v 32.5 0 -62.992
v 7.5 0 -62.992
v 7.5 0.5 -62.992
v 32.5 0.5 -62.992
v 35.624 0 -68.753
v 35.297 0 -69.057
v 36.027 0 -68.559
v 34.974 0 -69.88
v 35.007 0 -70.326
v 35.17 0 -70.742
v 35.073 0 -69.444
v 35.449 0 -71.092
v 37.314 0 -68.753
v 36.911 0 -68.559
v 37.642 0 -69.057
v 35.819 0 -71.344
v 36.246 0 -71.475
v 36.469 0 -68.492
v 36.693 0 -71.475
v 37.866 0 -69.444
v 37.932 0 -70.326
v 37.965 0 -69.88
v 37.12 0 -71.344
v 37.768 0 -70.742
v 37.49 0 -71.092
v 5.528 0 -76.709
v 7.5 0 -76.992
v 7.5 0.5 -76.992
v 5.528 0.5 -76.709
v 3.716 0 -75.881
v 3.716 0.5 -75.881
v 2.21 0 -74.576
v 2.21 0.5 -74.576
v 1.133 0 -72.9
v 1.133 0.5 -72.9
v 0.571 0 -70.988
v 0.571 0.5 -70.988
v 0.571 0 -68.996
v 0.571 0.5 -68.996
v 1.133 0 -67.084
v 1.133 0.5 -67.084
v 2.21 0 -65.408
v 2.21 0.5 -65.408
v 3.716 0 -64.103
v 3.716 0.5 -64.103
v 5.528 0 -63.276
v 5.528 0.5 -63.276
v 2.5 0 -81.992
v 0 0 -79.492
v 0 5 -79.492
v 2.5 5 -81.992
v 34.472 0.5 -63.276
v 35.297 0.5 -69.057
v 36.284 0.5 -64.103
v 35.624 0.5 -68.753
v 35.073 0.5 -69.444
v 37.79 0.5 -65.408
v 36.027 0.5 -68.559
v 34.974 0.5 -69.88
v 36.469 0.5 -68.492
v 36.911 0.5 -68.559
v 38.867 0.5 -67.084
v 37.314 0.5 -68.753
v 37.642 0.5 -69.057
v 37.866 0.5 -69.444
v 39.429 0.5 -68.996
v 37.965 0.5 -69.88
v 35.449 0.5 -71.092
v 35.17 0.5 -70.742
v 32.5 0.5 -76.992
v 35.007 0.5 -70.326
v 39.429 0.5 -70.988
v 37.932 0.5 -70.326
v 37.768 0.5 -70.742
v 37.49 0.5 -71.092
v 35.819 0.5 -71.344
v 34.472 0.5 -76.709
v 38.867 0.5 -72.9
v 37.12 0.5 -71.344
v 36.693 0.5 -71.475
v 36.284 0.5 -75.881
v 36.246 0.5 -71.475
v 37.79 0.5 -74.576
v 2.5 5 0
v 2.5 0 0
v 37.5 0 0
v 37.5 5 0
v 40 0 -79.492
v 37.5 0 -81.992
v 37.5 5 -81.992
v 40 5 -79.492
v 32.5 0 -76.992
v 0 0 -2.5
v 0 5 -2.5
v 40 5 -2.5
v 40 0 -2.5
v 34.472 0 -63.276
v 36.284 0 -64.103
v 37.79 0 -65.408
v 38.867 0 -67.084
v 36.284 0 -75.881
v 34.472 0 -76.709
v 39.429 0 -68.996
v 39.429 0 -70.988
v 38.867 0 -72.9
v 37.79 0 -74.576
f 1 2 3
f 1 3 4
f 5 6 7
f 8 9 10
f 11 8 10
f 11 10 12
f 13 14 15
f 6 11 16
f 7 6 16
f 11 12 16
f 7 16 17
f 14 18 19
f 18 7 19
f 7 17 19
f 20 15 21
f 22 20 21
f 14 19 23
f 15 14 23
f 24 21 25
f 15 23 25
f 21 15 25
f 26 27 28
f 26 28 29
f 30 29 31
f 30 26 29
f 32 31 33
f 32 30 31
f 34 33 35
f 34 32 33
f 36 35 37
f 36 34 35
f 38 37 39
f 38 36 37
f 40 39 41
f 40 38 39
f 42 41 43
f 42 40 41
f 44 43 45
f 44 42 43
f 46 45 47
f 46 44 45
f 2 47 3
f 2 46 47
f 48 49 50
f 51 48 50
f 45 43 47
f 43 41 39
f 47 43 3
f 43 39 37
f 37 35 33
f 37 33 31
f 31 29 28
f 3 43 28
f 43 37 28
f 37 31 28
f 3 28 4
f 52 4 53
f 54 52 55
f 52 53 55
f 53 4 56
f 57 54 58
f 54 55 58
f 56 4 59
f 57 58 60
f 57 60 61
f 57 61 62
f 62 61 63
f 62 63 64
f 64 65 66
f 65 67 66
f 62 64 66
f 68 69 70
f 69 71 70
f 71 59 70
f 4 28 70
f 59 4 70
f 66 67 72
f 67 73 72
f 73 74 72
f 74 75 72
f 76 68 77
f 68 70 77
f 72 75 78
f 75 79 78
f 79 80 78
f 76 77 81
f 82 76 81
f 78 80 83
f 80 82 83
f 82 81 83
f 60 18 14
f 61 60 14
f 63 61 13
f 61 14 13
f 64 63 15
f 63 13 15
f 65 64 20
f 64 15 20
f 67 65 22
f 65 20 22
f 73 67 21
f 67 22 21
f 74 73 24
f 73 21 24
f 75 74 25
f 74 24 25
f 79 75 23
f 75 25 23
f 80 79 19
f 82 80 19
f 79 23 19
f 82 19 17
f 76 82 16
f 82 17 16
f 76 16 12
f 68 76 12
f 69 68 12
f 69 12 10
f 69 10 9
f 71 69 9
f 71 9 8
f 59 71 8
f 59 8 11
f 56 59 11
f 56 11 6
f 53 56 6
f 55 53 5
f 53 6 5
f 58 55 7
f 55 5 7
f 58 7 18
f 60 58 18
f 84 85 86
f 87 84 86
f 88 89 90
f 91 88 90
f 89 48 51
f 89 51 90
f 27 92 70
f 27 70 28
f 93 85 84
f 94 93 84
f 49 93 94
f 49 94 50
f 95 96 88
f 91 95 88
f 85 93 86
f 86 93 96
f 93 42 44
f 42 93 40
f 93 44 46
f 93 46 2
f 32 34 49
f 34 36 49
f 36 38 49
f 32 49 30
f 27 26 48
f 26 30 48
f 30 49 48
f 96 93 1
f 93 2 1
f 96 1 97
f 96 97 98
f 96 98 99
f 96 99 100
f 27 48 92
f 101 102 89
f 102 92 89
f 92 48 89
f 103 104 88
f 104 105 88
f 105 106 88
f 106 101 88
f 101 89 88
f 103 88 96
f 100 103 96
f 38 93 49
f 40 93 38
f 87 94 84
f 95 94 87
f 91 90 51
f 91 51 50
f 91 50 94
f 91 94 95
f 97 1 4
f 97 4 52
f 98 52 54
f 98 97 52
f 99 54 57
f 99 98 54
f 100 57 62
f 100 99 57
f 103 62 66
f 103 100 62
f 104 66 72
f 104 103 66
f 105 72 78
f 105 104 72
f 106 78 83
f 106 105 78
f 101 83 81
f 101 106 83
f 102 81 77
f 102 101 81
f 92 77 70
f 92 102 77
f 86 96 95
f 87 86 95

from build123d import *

# Parameters (mm, degrees)
SKETCH1_W           = 40
SKETCH1_H           = 81.992065469
BOSS_EXTRUDE4_DEPTH = 5
CHAMFER3_SIZE       = 2.5
CHAMFER4_SIZE       = 2.5
CHAMFER5_SIZE       = 2.5
CHAMFER6_SIZE       = 2.5
SKETCH5_R           = 1.5
CUT_EXTRUDE5_DEPTH  = 0.5


with BuildPart() as part:
    # Sketch1 → Boss-Extrude4 (new body)
    with BuildSketch(Plane(origin=(0, 0, 0), x_dir=(1, 0, 0), z_dir=(0, 1, 0))):
        with Locations((20, 40.996032735)):
            Rectangle(SKETCH1_W, SKETCH1_H)
    extrude(amount=BOSS_EXTRUDE4_DEPTH)

    # Chamfer3
    chamfer3_edges = [part.edges().sort_by_distance(p)[0] for p in [
        (40, 2.5, -81.992065469),
    ]]
    chamfer(chamfer3_edges, length=CHAMFER3_SIZE)

    # Chamfer4
    chamfer4_edges = [part.edges().sort_by_distance(p)[0] for p in [
        (0, 2.5, -81.992065469),
    ]]
    chamfer(chamfer4_edges, length=CHAMFER4_SIZE)

    # Chamfer5
    chamfer5_edges = [part.edges().sort_by_distance(p)[0] for p in [
        (0, 2.5, 0),
    ]]
    chamfer(chamfer5_edges, length=CHAMFER5_SIZE)

    # Chamfer6
    chamfer6_edges = [part.edges().sort_by_distance(p)[0] for p in [
        (40, 2.5, 0),
    ]]
    chamfer(chamfer6_edges, length=CHAMFER6_SIZE)

    # Sketch5 → Cut-Extrude5 (cut)
    with BuildSketch(Plane(origin=(0, 0, 0), x_dir=(1, 0, 0), z_dir=(0, 1, 0))):
        with BuildLine():
            Line((7.5, 62.992065469), (32.5, 62.992065469))
            ThreePointArc((32.5, 62.992065469), (39.5, 69.992065469), (32.5, 76.992065469))
            Line((32.5, 76.992065469), (7.5, 76.992065469))
            ThreePointArc((7.5, 76.992065469), (0.5, 69.992065469), (7.5, 62.992065469))
        make_face()
        with Locations(Location((36.469361294, 69.992065469, 0), (0, 0, 270))):
            Circle(SKETCH5_R, mode=Mode.SUBTRACT)
    extrude(amount=CUT_EXTRUDE5_DEPTH, mode=Mode.SUBTRACT)


solid = part.part
